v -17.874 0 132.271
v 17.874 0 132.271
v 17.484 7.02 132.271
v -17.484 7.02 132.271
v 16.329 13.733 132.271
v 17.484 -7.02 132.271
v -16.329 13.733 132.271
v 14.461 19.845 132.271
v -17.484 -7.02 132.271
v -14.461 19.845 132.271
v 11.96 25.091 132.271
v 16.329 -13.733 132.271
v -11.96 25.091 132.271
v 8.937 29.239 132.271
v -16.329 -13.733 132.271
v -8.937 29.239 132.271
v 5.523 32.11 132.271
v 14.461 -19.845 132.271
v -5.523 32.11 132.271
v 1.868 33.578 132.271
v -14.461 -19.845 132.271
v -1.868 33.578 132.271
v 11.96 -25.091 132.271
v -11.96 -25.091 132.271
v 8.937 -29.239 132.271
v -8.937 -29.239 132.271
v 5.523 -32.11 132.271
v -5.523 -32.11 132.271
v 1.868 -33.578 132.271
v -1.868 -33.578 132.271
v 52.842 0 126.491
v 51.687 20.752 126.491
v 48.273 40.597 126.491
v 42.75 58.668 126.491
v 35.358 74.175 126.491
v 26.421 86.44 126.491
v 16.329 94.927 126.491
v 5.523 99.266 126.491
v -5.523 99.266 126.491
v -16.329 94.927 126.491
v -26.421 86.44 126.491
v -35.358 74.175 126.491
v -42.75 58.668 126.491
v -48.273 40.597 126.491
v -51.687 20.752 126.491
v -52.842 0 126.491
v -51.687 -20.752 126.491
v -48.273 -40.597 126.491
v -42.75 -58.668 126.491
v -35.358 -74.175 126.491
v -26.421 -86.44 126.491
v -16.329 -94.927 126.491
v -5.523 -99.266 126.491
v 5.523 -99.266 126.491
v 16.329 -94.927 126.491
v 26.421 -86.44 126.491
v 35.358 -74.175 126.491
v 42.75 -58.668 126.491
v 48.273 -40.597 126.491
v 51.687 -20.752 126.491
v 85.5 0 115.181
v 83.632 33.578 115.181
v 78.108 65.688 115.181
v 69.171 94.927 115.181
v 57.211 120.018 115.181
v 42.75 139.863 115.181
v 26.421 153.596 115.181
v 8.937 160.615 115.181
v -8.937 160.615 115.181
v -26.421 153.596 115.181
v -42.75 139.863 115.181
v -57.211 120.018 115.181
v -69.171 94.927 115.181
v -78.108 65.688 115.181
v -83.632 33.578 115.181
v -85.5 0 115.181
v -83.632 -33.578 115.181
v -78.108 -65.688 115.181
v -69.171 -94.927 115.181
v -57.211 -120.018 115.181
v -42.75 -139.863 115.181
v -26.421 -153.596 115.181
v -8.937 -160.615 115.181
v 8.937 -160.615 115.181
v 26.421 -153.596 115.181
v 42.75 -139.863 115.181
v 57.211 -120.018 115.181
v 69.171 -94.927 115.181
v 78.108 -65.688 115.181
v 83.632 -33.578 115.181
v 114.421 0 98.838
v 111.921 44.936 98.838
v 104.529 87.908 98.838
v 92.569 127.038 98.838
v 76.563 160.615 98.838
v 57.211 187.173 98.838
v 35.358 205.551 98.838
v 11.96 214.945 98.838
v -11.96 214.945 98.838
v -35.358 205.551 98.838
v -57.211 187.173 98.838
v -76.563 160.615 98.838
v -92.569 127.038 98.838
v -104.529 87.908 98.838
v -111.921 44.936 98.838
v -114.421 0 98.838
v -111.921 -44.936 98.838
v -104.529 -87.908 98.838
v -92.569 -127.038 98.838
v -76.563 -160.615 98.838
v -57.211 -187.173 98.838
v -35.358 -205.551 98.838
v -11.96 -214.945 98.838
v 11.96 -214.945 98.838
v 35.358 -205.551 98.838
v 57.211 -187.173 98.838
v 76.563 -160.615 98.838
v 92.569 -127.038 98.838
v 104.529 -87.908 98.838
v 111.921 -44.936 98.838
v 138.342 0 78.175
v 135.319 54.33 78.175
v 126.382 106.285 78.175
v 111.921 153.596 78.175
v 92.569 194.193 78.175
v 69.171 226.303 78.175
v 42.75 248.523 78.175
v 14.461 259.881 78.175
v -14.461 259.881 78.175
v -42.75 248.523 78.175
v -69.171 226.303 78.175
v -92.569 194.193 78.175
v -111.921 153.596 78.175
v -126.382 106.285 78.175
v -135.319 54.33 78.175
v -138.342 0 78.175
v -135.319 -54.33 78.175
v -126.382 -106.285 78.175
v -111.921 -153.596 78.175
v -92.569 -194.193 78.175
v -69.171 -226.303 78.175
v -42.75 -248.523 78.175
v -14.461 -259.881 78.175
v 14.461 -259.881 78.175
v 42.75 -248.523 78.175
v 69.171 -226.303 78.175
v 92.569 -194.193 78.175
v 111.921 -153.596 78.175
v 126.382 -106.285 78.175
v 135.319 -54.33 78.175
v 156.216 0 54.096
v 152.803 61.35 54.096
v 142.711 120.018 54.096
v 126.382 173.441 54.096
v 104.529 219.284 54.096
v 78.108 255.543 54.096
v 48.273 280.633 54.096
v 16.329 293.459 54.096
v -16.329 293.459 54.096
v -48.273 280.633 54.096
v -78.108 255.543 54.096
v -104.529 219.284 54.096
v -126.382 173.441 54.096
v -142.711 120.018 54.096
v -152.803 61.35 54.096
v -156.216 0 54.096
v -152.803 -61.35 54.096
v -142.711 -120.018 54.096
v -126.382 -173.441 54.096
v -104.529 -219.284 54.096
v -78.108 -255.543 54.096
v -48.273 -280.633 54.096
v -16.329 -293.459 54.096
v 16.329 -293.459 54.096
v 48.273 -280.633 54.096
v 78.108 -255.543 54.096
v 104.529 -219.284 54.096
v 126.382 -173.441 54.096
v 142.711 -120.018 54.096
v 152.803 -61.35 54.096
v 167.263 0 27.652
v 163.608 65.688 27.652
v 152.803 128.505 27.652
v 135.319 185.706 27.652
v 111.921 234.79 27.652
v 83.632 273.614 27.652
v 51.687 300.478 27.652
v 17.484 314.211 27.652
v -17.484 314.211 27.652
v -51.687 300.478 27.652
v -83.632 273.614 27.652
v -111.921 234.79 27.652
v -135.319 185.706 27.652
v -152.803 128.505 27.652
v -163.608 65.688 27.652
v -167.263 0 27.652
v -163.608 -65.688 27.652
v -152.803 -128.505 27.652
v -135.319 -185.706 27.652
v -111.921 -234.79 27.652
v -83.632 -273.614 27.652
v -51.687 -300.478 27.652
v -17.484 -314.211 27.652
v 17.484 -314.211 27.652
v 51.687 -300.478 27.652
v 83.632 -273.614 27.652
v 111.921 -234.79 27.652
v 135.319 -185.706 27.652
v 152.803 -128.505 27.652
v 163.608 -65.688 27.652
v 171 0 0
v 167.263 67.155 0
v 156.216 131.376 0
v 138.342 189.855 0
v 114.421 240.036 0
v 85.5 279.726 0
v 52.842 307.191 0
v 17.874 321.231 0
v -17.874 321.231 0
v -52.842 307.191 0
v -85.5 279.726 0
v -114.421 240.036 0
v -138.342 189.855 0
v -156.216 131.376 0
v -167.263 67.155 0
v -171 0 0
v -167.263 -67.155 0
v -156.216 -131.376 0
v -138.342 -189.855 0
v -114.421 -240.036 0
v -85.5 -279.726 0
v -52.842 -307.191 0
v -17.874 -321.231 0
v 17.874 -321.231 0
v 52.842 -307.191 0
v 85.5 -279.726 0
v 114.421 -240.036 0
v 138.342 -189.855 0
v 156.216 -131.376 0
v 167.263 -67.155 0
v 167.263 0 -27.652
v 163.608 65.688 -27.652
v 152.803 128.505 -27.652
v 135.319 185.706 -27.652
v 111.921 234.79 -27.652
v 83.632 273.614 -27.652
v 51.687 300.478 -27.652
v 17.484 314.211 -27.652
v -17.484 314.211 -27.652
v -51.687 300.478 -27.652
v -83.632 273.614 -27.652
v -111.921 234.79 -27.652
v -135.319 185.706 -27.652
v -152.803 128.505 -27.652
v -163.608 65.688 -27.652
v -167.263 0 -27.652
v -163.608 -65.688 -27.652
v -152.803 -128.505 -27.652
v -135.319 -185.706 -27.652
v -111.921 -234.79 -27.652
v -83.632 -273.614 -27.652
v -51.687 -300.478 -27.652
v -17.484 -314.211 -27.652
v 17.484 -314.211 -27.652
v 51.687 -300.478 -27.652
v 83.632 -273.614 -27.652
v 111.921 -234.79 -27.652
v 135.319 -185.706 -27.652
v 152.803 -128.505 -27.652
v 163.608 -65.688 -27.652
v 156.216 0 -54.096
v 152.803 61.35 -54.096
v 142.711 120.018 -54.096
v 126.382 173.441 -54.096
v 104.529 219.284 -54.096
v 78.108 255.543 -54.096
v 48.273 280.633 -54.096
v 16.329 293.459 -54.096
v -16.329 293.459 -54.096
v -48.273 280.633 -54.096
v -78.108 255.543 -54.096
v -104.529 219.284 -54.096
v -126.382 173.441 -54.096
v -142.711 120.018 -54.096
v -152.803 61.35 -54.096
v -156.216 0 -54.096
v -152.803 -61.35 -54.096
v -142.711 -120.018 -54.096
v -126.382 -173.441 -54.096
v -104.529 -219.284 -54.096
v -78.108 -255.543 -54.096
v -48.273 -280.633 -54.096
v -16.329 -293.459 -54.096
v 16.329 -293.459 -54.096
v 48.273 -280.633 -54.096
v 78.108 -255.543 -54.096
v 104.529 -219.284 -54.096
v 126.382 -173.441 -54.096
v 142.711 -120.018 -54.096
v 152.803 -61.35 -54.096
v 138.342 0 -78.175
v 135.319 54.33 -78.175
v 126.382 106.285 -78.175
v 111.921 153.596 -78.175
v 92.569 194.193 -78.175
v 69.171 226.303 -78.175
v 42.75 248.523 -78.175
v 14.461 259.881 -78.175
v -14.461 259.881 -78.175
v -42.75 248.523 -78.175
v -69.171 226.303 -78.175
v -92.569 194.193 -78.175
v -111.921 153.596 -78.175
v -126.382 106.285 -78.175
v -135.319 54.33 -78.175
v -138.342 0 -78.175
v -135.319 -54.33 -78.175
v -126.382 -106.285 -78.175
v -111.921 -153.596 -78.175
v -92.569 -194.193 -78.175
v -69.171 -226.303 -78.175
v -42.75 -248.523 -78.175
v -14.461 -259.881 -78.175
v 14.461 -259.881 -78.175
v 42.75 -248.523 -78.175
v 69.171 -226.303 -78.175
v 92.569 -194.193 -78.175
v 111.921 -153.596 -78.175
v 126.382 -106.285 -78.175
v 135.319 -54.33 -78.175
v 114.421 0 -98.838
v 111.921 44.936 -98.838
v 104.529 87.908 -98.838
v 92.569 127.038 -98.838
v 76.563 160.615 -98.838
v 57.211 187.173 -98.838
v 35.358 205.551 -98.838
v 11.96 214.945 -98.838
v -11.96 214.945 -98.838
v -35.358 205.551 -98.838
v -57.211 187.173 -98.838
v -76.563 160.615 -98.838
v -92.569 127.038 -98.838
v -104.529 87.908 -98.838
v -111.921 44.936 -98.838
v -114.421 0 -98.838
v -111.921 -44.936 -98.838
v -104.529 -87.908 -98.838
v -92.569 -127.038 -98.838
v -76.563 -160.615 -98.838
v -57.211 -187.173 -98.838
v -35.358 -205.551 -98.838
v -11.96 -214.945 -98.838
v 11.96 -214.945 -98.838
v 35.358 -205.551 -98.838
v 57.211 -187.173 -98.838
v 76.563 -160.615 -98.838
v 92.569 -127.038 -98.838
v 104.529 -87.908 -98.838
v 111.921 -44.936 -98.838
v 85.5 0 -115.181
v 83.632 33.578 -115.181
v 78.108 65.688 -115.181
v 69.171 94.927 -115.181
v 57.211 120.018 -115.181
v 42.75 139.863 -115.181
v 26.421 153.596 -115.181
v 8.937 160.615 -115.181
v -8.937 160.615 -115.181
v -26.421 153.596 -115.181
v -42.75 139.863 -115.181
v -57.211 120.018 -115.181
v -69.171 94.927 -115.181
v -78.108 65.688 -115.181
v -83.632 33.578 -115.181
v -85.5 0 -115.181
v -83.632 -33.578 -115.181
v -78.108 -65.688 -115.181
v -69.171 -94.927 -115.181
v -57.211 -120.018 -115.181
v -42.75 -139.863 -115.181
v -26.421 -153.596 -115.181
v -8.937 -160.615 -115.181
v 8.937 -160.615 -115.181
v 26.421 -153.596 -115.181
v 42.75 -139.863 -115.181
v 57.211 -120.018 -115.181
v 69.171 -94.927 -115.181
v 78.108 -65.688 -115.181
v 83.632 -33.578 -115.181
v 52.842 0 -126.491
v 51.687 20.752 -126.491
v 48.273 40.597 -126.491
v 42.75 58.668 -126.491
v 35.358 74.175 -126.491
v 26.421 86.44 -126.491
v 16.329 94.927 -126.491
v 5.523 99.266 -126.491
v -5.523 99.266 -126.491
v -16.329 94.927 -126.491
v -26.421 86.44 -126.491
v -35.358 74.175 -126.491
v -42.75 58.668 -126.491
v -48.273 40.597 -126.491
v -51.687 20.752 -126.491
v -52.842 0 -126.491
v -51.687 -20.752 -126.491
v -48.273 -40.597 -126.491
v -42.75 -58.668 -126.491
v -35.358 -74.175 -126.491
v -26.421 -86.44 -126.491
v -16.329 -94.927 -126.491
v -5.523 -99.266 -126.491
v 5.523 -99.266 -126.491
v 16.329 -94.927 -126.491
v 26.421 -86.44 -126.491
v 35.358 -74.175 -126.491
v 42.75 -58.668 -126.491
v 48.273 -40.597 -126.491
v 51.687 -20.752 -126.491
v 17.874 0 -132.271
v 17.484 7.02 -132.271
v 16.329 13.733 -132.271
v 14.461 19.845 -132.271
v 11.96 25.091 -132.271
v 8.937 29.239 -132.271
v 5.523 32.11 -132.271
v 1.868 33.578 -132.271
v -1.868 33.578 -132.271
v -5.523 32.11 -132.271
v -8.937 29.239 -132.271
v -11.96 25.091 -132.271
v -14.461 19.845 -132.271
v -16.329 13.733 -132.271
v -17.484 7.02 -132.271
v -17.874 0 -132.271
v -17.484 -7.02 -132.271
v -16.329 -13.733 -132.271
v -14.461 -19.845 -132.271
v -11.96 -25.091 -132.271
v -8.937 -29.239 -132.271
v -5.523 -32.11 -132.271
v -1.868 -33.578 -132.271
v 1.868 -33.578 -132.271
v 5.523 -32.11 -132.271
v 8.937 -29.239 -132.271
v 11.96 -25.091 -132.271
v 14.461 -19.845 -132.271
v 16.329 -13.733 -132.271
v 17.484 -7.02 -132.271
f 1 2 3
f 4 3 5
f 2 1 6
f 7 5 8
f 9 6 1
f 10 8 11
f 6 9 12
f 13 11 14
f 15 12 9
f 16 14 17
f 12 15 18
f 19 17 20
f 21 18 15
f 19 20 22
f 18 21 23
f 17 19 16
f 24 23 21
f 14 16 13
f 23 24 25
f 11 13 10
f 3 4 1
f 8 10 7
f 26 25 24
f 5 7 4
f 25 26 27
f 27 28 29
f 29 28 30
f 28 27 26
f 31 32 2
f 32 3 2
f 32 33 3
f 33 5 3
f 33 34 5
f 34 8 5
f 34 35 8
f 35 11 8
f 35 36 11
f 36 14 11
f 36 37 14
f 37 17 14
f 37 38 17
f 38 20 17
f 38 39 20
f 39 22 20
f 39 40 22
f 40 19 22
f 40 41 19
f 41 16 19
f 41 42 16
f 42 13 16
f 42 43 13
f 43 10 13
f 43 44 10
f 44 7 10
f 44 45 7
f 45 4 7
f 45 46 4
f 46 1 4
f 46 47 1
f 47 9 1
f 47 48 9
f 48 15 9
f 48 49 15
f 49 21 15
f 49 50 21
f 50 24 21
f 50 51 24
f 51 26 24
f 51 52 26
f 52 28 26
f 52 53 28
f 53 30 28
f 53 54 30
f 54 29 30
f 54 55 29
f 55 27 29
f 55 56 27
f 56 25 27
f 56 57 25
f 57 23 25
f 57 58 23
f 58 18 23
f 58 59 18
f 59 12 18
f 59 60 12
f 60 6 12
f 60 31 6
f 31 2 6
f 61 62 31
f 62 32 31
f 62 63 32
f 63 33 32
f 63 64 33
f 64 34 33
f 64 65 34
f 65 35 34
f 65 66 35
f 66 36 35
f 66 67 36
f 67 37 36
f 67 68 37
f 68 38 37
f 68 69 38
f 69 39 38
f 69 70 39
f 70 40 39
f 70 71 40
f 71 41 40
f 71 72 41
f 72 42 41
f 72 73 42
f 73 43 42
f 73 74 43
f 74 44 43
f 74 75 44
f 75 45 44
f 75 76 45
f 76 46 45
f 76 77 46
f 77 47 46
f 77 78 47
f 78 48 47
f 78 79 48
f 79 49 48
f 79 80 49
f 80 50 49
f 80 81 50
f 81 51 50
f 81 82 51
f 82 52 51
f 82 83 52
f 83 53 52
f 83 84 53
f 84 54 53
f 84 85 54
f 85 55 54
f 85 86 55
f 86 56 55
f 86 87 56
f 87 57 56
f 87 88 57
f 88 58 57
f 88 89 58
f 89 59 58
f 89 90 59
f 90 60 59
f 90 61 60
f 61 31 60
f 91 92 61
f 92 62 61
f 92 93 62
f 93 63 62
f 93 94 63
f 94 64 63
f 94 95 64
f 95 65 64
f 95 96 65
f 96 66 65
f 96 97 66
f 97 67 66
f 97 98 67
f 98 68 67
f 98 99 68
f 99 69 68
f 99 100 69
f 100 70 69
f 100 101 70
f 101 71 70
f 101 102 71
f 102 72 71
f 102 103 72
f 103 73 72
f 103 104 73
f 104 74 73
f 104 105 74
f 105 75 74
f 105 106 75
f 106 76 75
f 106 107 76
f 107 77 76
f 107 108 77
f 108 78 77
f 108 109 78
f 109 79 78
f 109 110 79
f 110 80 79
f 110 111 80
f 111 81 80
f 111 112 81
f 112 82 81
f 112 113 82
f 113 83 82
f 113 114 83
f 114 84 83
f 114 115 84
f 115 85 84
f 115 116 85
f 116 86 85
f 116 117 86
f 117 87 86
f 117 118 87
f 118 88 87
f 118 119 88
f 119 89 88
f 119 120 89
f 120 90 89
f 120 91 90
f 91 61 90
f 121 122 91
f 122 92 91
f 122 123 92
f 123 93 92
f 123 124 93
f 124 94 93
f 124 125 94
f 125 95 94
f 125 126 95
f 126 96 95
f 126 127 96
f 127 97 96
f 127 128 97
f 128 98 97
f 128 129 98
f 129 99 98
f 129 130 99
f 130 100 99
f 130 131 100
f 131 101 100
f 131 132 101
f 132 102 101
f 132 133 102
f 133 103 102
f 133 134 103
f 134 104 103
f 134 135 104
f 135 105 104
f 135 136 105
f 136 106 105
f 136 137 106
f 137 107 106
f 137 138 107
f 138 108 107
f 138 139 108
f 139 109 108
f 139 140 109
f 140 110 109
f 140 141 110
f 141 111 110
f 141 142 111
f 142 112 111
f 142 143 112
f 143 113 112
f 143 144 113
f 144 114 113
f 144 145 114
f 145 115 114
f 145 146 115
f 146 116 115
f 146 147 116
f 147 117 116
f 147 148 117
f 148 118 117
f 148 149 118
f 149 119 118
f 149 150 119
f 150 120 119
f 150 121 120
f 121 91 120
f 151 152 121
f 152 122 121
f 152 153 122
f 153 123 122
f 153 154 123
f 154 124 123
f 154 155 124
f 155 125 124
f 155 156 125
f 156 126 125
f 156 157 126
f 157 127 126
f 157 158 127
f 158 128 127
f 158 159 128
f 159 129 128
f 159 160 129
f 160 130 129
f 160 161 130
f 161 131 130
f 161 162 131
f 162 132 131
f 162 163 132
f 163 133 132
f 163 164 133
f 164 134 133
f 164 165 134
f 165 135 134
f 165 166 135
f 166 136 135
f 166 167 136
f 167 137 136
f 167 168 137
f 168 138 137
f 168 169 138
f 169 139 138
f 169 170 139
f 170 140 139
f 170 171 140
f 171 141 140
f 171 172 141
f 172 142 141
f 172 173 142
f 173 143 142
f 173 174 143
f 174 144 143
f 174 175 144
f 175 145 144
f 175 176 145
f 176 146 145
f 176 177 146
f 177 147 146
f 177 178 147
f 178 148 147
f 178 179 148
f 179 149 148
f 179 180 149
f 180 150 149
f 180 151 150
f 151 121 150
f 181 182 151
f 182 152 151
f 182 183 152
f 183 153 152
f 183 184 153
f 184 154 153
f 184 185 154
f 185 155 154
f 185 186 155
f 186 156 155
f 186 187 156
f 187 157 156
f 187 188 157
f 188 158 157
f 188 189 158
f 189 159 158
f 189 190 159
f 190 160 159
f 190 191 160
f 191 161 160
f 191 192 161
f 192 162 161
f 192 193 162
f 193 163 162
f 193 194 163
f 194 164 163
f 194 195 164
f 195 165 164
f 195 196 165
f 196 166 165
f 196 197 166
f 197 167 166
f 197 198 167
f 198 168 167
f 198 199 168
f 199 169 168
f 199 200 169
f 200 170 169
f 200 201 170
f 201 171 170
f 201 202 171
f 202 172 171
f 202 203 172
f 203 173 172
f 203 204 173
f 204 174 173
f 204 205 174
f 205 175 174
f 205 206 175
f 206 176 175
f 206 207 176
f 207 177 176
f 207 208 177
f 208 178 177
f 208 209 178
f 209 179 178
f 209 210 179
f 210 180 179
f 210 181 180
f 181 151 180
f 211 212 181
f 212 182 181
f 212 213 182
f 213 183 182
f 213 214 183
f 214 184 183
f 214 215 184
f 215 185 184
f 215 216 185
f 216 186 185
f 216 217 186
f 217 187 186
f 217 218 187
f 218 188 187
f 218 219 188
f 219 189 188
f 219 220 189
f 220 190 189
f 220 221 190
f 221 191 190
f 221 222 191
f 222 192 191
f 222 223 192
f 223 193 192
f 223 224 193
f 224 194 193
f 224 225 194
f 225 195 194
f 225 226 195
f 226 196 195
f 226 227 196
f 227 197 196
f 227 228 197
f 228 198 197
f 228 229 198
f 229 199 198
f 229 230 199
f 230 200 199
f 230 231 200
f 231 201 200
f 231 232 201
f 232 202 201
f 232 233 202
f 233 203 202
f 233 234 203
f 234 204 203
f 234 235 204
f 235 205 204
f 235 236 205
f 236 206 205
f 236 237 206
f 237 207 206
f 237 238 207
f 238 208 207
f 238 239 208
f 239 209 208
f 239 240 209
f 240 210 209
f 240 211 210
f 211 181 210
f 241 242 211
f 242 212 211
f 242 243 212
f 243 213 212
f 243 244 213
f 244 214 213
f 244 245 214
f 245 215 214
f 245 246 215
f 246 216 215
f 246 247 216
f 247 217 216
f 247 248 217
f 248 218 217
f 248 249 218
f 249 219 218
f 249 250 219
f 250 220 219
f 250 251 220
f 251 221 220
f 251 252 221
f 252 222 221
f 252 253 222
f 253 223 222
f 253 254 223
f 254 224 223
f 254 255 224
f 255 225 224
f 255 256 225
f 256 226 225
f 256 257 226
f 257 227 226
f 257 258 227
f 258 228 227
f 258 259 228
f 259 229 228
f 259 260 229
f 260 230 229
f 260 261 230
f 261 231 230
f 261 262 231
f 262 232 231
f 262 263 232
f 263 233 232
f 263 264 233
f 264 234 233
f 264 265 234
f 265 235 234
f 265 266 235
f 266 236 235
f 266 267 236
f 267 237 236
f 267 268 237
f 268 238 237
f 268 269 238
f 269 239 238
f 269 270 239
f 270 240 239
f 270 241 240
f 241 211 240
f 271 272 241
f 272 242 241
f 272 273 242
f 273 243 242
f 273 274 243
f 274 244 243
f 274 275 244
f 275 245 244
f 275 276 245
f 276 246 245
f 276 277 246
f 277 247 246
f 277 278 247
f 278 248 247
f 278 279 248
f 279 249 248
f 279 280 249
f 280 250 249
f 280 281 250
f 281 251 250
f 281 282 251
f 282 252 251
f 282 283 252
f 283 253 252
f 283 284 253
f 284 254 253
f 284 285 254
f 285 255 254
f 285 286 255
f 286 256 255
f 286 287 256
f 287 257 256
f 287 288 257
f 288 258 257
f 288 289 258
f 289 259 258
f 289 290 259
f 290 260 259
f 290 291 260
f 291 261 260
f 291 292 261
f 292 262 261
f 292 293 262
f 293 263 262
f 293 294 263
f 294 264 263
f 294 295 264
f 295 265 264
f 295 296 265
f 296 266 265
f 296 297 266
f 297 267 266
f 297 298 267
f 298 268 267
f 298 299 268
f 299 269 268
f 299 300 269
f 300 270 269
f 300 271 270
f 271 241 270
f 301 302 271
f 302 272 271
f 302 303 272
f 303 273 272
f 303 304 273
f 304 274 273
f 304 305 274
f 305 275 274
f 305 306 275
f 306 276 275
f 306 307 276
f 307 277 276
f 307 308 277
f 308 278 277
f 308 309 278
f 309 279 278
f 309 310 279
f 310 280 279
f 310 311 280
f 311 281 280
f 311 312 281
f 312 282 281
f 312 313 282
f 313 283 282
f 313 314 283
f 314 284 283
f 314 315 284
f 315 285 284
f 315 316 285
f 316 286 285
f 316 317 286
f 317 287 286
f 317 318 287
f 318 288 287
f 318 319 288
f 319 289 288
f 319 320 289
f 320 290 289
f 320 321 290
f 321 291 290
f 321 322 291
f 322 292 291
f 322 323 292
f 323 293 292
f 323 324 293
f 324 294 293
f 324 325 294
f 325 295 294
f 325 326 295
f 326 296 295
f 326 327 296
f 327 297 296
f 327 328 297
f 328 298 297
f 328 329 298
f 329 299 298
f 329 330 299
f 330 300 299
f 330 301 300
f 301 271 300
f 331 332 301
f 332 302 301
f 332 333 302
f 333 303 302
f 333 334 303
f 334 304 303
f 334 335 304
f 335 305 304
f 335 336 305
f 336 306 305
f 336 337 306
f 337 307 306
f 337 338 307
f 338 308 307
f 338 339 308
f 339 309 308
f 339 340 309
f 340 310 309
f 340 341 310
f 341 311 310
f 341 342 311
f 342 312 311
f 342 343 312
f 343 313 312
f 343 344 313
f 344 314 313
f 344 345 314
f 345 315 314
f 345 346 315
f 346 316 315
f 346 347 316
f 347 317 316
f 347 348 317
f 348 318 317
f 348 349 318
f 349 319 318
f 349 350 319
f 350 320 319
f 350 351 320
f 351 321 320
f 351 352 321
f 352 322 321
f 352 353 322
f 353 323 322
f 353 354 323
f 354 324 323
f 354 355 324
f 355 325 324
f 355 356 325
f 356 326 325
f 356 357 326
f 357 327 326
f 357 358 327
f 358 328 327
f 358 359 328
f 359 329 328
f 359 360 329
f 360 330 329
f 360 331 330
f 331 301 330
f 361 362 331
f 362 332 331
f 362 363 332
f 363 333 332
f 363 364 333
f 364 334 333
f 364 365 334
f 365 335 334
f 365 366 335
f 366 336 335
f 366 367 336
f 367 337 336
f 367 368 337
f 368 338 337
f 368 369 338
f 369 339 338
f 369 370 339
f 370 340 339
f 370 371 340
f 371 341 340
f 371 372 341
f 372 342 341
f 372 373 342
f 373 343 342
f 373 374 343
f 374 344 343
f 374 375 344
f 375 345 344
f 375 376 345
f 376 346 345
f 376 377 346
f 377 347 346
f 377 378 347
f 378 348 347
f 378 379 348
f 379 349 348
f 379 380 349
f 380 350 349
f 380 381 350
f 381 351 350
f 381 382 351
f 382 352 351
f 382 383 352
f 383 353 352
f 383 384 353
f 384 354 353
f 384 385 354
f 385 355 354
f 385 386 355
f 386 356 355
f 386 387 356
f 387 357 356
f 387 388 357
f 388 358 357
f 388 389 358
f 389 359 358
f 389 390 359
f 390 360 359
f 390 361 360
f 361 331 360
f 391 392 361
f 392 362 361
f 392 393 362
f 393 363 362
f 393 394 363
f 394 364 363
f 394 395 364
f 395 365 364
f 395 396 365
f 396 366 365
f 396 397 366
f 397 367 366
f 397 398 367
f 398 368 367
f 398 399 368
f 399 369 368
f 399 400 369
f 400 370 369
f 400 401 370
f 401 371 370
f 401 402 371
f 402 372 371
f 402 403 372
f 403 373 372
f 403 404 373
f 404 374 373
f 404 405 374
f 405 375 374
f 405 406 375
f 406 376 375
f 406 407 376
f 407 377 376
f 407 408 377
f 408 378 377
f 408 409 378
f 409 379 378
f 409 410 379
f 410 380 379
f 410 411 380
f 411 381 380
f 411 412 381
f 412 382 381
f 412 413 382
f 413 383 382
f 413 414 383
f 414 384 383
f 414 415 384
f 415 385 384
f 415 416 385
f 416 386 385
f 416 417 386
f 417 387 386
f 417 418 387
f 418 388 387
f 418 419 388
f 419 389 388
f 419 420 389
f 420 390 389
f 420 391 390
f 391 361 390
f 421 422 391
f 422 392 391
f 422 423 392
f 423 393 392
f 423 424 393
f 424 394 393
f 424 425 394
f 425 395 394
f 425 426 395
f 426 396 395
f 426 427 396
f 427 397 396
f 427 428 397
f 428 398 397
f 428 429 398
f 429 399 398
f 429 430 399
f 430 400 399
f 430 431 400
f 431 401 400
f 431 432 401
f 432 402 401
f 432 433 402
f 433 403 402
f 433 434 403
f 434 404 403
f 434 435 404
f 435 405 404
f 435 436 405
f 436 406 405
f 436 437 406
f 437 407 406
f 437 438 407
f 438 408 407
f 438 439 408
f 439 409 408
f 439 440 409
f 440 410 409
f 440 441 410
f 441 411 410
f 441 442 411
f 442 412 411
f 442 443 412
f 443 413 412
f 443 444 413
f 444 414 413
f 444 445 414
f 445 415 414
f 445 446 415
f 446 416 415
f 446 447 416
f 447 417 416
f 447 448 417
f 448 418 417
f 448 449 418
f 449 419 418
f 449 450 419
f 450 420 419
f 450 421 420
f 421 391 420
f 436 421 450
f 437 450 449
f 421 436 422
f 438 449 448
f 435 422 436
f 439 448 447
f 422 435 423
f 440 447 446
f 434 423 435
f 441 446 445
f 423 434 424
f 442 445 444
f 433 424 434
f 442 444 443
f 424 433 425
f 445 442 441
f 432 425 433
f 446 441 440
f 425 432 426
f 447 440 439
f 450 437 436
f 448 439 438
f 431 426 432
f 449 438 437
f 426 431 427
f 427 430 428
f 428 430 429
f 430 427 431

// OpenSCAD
// Generated by SolidPython 1.0.1 on 2020-07-29 00:46:49


scale(v = [9, 17, 7]) {
	sphere(r = 19);
}
/***********************************************
*********      SolidPython code:      **********
************************************************
 
# import packages: SolidPython
from solid import *
from solid.utils import *
from itertools import chain, combinations, permutations


class Resize:

    def __init__(self, scad_file):
        self.scad_file = scad_file
        #self.scad_file = import_scad(scad_file)
        # cone/cylinder param:
        self.r1 = 0
        self.r2 = 0
        self.h = 0
        # rectangular prism param:
        self.w = 0
        self.l = 0
        # ellipse param:
        self.r = 0

    # import OpenScad code (file name corresponds to shape)


    # classify shape + parameters
    def assign(self, param1, param2, param3):
        if self.scad_file == 'cone.scad':
            self.r1 = param1
            self.r2 = param2
            self.h = param3
        elif self.scad_file == 'cylinder.scad':
            self.r1 = param1
            self.r2 = param2
            self.h = param3
        elif self.scad_file == 'rectangularPrism.scad':
            self.h = param1
            self.l = param2
            self.w = param3
        else:
            self.r = param1
            self.h = param2

    # resize parameters
    def iterate(self):
        x = range(3, 20, 2)
        i = 1
        if self.scad_file == 'cone.scad':
            tempList = list(permutations(x, 2))
            for temp in tempList:
                param1 = temp[0]
                param2 = temp[1]
                filepath = 'produced_scad_files/' + 'cone' + str(param1) + '_' + str(param2) + '_' + '.scad'
                scad_render_to_file(cylinder(h=param1, r1=param2, r2=0), filepath)

        elif self.scad_file == 'cylinder.scad':
            tempList = list(permutations(x, 3))
            for temp in tempList:
                param1 = temp[0]
                param2 = temp[1]
                filepath = 'produced_scad_files/' + 'cylinder' + str(param1) + '_' + str(param2) + '_' + '.scad'
                scad_render_to_file(cylinder(h=param1, r1=param2, r2=param2), filepath)

        elif self.scad_file == 'rectangularPrism.scad':
            tempList = list(permutations(x, 3))
            for temp in tempList:
                param1 = temp[0]
                param2 = temp[1]
                param3 = temp[2]
                filepath = 'produced_scad_files/' + 'rectangularPrism' + str(param1) + '_' + str(param2) + '_' + str(
                    param3) + '.scad'
                scad_render_to_file(cube(size=(param1, param2, param3)), filepath)

        elif self.scad_file == 'ellipse.scad':
            tempList = list(permutations(x, 4))
            for temp in tempList:
                param1 = temp[0]
                param2 = temp[1]
                param3 = temp[2]
                param4 = temp[3]
                filepath = 'produced_scad_files/' + 'ellipse' + str(param1) + '_' + str(param2) + '_' + str(param3) + '_' + str(param4) + '.scad'
                scad_render_to_file(scale([param1, param2, param3])(sphere(r=param4)), filepath)

    def render_to_scadfile(self):
        scad_render_to_file(scad, 'example.scad') 
 
************************************************/
